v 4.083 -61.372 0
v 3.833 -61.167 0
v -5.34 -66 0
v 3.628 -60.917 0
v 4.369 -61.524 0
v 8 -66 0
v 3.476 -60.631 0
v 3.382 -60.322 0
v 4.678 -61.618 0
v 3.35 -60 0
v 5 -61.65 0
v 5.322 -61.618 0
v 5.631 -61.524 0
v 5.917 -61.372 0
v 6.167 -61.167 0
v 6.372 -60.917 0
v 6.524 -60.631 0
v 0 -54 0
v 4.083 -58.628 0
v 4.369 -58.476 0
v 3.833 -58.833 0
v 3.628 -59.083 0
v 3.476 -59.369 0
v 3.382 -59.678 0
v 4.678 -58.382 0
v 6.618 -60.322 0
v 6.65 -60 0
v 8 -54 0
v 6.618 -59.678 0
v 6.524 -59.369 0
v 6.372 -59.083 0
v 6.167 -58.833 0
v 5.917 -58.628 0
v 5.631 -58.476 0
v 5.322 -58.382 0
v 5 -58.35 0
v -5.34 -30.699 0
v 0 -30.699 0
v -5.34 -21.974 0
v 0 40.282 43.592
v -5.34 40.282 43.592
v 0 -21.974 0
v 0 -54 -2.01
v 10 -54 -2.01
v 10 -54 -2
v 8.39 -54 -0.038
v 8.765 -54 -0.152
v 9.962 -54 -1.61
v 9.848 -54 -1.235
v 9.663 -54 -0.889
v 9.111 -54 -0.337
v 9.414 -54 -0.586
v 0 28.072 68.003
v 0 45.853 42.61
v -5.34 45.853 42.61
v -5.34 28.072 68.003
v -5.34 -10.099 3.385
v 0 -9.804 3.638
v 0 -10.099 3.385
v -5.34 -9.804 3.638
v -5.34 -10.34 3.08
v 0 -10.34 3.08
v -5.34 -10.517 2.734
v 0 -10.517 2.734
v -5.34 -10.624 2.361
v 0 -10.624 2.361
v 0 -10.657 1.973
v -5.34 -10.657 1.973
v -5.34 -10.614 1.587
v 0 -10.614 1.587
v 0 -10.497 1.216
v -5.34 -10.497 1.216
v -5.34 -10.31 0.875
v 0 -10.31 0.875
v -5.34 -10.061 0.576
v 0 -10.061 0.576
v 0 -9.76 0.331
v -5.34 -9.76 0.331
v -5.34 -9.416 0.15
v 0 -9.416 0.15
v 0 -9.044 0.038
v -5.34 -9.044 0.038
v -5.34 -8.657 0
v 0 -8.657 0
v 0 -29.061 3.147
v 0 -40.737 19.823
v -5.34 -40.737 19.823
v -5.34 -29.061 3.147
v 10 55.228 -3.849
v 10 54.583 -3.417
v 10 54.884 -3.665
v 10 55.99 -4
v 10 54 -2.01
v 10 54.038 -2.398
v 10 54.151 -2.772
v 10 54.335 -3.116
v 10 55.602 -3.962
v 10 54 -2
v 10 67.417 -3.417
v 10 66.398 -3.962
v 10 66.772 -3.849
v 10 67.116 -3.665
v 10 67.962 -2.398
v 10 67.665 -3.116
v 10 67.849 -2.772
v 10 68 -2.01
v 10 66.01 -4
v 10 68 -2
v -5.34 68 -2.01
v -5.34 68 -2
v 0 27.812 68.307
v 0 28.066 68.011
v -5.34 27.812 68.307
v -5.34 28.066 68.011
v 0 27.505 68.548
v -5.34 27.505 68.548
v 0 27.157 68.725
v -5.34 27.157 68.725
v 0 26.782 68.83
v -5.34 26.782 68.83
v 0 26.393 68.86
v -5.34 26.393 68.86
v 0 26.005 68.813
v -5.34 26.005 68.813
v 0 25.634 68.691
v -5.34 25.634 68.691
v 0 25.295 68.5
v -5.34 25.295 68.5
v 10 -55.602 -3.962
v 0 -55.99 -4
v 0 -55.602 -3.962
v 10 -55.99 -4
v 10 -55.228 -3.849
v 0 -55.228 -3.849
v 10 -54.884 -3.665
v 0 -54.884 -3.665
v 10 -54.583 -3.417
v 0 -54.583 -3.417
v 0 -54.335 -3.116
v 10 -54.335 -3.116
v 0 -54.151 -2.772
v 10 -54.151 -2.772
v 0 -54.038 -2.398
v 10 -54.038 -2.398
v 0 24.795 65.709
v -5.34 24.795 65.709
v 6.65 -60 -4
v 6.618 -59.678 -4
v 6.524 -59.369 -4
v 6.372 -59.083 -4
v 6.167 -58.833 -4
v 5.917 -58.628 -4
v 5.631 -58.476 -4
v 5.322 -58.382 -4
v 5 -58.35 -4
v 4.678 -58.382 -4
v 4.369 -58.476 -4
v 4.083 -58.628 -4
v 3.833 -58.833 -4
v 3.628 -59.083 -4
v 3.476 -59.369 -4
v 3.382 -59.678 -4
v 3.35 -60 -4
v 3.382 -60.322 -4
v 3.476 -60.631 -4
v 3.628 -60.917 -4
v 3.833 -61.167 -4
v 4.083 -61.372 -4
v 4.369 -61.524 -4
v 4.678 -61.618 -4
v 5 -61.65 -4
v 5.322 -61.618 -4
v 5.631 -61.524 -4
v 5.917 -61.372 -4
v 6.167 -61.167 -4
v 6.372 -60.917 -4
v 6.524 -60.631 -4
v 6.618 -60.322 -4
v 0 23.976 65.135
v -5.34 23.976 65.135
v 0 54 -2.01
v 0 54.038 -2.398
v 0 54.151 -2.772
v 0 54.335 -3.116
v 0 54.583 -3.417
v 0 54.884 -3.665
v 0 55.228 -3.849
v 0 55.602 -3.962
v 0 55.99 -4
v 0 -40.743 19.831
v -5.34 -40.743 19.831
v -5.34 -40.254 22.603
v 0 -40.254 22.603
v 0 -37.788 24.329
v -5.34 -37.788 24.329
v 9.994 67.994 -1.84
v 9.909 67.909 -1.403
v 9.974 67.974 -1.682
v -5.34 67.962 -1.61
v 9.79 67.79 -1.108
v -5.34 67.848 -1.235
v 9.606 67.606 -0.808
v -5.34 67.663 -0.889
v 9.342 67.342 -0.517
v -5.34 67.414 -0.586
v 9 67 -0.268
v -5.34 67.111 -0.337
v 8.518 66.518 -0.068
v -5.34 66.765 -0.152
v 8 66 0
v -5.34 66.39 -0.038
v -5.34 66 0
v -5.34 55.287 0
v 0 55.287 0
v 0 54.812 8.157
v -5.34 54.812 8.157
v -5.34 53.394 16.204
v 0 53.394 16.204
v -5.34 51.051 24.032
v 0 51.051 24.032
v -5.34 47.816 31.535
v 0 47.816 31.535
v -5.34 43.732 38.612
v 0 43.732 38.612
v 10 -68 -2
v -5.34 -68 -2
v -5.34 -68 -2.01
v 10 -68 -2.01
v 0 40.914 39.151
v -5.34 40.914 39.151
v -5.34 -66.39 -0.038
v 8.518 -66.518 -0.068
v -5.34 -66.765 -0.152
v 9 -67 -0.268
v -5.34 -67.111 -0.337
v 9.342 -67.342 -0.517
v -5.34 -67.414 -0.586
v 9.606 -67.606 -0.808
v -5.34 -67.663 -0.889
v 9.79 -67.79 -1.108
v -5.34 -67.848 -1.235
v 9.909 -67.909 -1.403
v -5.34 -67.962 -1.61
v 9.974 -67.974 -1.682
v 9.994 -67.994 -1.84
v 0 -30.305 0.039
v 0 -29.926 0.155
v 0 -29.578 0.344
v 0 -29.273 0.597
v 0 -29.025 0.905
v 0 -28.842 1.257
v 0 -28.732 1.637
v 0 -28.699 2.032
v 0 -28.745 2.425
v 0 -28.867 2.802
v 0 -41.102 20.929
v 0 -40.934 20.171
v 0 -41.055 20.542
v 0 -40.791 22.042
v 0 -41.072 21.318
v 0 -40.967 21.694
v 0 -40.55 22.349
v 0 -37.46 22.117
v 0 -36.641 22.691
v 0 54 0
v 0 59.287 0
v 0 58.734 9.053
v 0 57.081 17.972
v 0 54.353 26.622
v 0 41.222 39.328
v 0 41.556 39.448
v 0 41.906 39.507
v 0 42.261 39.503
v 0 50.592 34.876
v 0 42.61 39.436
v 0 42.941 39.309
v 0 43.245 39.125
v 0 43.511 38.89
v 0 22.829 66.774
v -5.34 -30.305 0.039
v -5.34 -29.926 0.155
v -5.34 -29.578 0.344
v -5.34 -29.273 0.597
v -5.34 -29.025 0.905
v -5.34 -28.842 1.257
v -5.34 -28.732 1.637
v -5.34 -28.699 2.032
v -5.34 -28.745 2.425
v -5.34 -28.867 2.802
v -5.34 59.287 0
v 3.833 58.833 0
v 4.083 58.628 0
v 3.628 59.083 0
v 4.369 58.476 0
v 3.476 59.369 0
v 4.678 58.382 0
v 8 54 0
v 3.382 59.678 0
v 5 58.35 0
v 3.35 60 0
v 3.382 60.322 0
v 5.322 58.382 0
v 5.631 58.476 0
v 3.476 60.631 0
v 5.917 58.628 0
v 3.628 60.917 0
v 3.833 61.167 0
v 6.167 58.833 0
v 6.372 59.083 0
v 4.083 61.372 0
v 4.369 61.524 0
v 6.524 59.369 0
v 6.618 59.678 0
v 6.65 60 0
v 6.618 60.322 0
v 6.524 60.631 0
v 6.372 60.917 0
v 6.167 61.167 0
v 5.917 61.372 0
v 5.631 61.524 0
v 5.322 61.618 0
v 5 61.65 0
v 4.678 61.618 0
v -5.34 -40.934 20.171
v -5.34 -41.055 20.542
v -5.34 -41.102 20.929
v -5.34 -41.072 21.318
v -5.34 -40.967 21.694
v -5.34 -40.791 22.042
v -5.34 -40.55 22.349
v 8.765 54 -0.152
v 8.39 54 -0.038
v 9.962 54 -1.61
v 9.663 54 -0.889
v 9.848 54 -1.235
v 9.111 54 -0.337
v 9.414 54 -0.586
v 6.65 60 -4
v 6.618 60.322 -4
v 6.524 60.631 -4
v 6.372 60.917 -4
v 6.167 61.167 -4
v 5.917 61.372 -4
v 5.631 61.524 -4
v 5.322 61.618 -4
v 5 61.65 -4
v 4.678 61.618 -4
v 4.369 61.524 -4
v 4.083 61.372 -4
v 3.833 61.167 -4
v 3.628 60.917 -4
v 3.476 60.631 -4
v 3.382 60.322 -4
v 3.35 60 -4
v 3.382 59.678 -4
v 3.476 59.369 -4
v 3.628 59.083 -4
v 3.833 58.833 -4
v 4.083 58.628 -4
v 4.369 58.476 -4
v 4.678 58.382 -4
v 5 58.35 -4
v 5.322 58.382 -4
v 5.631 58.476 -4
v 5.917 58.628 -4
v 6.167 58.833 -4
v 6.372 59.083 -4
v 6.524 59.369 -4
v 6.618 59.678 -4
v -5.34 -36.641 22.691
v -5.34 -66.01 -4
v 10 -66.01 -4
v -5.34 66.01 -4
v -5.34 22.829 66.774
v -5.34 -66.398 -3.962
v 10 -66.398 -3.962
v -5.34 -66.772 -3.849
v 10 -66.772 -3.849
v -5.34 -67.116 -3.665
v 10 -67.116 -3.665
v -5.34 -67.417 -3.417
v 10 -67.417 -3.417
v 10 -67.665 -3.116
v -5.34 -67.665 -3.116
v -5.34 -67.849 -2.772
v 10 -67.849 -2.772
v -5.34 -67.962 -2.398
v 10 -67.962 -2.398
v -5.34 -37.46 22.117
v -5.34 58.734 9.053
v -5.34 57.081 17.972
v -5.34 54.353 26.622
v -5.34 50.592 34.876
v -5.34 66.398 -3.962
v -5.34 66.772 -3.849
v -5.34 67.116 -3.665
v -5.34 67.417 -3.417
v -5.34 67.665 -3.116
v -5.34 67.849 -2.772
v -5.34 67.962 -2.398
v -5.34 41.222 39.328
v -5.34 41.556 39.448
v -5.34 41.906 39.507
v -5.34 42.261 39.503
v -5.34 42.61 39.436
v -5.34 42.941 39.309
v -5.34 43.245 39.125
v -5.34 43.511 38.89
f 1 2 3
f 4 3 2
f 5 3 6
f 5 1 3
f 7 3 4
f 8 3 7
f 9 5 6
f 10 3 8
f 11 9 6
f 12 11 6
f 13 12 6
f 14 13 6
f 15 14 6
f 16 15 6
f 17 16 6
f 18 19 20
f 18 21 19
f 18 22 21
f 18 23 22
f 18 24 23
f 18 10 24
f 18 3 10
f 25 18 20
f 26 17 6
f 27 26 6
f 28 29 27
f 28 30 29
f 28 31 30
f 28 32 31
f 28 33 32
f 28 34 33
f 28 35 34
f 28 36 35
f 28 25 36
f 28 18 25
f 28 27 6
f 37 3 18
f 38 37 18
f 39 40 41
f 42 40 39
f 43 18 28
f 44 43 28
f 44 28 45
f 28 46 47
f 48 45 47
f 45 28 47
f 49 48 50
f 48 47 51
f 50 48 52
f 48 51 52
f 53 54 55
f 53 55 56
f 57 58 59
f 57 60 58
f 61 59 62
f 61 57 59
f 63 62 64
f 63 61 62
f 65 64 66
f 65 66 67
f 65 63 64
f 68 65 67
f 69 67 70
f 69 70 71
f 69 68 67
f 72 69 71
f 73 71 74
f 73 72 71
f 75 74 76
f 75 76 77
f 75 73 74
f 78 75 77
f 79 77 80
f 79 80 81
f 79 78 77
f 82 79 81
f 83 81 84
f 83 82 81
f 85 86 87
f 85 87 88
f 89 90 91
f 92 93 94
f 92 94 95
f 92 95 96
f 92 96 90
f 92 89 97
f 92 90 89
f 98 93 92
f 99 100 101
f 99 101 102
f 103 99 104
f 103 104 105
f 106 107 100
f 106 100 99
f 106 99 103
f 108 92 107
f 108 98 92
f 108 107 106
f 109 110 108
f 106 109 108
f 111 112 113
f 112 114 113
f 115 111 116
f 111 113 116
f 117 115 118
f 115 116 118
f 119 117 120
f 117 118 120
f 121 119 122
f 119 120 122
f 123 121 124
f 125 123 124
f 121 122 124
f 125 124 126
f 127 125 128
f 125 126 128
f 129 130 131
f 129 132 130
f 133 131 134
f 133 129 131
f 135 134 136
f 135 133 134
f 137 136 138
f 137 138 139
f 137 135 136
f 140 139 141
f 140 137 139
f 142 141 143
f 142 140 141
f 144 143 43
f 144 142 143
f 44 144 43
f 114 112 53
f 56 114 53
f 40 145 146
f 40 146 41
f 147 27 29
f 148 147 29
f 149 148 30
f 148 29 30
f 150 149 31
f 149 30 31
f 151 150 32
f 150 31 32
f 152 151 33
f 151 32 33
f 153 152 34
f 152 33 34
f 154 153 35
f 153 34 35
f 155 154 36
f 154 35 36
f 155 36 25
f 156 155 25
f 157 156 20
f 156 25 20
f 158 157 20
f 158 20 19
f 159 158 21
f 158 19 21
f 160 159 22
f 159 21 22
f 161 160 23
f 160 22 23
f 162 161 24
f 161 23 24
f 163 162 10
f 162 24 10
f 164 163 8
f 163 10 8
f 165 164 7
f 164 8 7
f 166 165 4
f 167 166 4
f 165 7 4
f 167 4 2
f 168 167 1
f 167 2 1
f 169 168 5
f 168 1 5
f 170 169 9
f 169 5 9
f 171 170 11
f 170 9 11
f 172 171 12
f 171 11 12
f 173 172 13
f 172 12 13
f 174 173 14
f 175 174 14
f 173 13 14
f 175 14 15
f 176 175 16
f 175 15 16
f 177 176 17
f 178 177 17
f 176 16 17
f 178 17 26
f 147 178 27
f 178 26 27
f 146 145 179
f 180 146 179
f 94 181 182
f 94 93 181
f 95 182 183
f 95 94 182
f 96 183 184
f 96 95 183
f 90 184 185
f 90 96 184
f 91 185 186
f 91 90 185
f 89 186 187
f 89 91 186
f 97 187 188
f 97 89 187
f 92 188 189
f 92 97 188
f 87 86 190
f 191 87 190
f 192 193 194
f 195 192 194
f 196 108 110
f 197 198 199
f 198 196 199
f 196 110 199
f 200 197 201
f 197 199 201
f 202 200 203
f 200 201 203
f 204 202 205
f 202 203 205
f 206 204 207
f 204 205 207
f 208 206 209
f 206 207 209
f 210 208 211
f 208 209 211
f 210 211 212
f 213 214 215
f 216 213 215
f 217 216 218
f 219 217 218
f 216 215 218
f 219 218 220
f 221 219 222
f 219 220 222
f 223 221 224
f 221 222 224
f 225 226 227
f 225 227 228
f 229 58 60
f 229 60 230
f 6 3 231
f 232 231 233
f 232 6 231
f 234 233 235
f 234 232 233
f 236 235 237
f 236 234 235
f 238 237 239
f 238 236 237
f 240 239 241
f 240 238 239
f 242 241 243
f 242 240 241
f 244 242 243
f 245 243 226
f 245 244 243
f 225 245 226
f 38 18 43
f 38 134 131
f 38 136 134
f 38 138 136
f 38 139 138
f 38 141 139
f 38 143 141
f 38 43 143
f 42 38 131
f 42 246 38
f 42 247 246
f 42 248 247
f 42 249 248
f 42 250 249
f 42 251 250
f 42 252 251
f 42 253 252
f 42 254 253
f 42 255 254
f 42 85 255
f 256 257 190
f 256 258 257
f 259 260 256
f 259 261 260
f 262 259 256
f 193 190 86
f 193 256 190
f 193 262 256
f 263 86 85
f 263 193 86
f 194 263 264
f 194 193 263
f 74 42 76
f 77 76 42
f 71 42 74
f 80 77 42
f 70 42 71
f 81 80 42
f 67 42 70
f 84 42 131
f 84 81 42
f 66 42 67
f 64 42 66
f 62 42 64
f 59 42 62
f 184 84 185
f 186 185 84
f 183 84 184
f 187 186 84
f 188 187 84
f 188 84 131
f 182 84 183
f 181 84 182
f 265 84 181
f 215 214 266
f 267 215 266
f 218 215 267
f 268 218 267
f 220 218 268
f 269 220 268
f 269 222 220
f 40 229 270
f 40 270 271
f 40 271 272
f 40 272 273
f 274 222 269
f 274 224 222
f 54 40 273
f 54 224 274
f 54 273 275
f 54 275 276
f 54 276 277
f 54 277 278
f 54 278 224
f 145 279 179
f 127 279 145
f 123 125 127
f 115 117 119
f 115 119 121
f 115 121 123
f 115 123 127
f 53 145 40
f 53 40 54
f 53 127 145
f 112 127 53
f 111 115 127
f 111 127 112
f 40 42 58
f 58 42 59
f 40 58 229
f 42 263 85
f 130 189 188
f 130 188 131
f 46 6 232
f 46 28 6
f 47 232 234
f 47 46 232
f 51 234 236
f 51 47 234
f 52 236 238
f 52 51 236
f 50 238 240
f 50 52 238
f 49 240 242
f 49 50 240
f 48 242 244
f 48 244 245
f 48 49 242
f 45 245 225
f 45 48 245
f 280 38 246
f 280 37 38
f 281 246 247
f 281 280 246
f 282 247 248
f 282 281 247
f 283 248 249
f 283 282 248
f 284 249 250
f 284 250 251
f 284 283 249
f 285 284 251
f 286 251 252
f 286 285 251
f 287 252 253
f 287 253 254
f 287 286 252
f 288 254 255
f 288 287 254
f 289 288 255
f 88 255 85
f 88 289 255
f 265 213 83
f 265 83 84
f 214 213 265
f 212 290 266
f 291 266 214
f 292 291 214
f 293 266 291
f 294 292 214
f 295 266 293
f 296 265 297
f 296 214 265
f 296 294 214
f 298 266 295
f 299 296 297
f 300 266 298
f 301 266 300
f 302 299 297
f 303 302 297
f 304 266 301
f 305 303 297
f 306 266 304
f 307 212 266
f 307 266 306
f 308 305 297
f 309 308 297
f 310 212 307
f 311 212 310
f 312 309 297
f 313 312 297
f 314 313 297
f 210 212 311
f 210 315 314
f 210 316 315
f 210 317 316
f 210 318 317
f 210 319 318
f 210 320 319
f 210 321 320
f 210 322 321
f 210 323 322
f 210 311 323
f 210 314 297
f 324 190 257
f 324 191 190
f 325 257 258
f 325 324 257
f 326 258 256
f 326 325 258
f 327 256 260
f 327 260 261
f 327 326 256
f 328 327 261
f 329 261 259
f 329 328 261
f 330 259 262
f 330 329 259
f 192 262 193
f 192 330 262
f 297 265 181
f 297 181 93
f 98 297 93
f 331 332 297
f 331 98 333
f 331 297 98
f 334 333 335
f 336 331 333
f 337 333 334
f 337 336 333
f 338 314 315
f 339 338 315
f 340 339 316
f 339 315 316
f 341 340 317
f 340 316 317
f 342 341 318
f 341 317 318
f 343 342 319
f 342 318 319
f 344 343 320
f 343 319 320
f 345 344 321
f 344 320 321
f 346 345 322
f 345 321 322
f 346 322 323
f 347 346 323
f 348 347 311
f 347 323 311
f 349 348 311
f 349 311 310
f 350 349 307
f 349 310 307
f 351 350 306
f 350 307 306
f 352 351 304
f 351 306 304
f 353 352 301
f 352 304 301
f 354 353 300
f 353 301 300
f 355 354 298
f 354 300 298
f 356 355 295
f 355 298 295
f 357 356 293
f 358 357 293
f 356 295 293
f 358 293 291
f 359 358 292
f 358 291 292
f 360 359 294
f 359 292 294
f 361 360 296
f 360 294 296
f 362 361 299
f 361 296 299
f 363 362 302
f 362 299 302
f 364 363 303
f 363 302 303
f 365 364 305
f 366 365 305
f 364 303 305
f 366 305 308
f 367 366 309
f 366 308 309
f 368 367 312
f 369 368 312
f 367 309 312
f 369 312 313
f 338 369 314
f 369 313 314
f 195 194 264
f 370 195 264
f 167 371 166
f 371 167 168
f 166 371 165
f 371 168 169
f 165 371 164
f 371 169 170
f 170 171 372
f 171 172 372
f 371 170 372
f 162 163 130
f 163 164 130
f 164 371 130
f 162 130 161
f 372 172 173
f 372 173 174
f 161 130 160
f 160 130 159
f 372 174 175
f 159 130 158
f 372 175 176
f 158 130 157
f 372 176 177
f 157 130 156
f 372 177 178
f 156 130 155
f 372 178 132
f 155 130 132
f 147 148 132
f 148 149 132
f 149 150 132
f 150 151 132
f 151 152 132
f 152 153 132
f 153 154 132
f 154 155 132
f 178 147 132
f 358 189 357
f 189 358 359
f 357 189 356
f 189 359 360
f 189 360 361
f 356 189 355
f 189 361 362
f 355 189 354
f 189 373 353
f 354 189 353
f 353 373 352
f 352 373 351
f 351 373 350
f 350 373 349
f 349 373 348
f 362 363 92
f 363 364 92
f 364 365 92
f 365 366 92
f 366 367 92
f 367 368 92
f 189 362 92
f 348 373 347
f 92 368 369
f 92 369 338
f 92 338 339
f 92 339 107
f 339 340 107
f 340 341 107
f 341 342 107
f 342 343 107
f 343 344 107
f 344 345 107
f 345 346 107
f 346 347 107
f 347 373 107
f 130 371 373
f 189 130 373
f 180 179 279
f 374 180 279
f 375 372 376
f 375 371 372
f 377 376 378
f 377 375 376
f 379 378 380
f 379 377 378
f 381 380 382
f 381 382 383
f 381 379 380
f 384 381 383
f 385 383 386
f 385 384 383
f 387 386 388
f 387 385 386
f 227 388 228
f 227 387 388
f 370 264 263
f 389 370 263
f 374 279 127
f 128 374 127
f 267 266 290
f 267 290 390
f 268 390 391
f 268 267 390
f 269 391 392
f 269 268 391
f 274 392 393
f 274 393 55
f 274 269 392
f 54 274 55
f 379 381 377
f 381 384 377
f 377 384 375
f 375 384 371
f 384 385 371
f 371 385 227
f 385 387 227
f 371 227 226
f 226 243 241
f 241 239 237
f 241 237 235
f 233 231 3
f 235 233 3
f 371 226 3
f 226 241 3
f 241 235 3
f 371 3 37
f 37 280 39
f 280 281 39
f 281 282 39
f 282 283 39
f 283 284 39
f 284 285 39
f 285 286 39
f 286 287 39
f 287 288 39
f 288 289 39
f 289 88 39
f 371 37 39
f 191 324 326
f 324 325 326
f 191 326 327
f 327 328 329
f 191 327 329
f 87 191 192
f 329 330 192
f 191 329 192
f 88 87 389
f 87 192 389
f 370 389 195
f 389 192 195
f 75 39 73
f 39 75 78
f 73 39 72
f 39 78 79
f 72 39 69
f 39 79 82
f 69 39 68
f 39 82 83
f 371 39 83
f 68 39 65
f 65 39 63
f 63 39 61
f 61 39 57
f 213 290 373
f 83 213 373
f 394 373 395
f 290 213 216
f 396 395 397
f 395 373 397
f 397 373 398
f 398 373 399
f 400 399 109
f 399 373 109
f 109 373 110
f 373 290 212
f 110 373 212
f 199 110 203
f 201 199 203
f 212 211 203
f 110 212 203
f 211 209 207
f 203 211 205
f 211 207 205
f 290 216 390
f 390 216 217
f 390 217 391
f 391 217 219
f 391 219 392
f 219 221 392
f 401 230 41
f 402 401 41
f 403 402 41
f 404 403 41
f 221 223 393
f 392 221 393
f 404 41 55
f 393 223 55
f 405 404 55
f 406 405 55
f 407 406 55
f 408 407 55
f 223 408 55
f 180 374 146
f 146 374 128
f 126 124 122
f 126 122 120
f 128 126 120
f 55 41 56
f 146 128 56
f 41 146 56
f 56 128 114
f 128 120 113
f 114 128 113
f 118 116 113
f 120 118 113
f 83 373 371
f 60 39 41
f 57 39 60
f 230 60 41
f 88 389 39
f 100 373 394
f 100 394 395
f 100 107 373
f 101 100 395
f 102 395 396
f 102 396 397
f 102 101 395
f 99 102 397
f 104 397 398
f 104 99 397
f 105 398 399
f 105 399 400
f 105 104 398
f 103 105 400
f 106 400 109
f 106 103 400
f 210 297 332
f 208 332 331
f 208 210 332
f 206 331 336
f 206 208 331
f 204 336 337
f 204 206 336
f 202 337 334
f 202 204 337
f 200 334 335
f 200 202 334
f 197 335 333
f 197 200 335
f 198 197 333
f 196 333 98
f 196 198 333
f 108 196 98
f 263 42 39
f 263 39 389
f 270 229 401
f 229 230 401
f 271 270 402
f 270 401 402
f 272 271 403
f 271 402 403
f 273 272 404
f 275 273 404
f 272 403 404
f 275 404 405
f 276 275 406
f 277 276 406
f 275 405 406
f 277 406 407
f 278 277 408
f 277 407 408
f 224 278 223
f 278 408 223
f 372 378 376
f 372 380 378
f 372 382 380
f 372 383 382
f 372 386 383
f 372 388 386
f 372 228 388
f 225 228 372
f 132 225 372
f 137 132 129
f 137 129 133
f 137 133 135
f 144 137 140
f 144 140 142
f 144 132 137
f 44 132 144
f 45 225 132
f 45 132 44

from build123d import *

# Parameters (mm, degrees)
SKETCH_W     = 5.34
SKETCH_H     = 136
PAD_DEPTH    = 4
PAD001_DEPTH = 5.34
SKETCH002_W  = 10
SKETCH002_H  = 14
SKETCH002_R  = 1.65
PAD002_DEPTH = 4
FILLET_R     = 2
FILLET001_R  = 1.99


with BuildPart() as part:
    # Sketch → Pad (new body)
    with BuildSketch(Plane.XY):
        with Locations((-2.67, 0)):
            Rectangle(SKETCH_W, SKETCH_H)
    extrude(amount=-PAD_DEPTH)

    # Sketch001 → Pad001 (join)
    with BuildSketch(Plane.YZ):
        with BuildLine():
            ThreePointArc((59.287408, 0), (55.84916, 22.338654), (45.852682, 42.609507))
            Line((45.852682, 42.609507), (28.071813, 68.00322))
            Line((26.92466, 69.641524), (28.071813, 68.00322))
            Line((22.828899, 66.773642), (26.92466, 69.641524))
            Line((23.976052, 65.135338), (22.828899, 66.773642))
            Line((24.795204, 65.708914), (23.976052, 65.135338))
            Line((24.795204, 65.708914), (40.281768, 43.591809))
            Line((40.281768, 43.591809), (-21.973787, 0))
            Line((-21.973787, 0), (-37.460351, 22.117105))
            Line((-36.641199, 22.690682), (-37.460351, 22.117105))
            Line((-37.788352, 24.328986), (-36.641199, 22.690682))
            Line((-41.884112, 21.461104), (-37.788352, 24.328986))
            Line((-40.736959, 19.822799), (-41.884112, 21.461104))
            Line((-40.736959, 19.822799), (-26.856886, 0))
            Line((-26.856886, 0), (-26.856886, -1))
            Line((-26.856886, -1), (-15, -1))
            Line((-15, -1), (-15, 0))
            Line((-15, 0), (42.576074, 40.315201))
            ThreePointArc((55.287408, 0), (52.034292, 21.135831), (42.576074, 40.315201))
            Line((55.287408, 0), (59.287408, 0))
        make_face()
    extrude(amount=-PAD001_DEPTH)

    # Sketch002 → Pad002 (join)
    with BuildSketch(Plane.XY):
        with Locations((5, 61)):
            Rectangle(SKETCH002_W, SKETCH002_H)
        with Locations((5, 60)):
            Circle(SKETCH002_R, mode=Mode.SUBTRACT)
        with Locations((5, -61)):
            Rectangle(SKETCH002_W, SKETCH002_H)
        with Locations((5, -60)):
            Circle(SKETCH002_R, mode=Mode.SUBTRACT)
    extrude(amount=-PAD002_DEPTH)

    # Fillet
    fillet_edges = [part.edges().sort_by_distance(p)[0] for p in [
        (10, 61, 0),
        (10, -61, 0),
        (5, -68, 0),
        (5, 68, 0),
        (-2.67, -26.856886, 0),
        (-2.67, -15, 0),
        (-2.67, 42.576074, 40.315201),
    ]]
    fillet(fillet_edges, radius=FILLET_R)

    # Fillet001
    fillet001_edges = [part.edges().sort_by_distance(p)[0] for p in [
        (5, -68, -4),
        (5, 68, -4),
        (5, 54, -4),
        (5, -54, -4),
        (-2.67, -41.884112, 21.461104),
        (-2.67, 26.92466, 69.641524),
    ]]
    fillet(fillet001_edges, radius=FILLET001_R)


solid = part.part
